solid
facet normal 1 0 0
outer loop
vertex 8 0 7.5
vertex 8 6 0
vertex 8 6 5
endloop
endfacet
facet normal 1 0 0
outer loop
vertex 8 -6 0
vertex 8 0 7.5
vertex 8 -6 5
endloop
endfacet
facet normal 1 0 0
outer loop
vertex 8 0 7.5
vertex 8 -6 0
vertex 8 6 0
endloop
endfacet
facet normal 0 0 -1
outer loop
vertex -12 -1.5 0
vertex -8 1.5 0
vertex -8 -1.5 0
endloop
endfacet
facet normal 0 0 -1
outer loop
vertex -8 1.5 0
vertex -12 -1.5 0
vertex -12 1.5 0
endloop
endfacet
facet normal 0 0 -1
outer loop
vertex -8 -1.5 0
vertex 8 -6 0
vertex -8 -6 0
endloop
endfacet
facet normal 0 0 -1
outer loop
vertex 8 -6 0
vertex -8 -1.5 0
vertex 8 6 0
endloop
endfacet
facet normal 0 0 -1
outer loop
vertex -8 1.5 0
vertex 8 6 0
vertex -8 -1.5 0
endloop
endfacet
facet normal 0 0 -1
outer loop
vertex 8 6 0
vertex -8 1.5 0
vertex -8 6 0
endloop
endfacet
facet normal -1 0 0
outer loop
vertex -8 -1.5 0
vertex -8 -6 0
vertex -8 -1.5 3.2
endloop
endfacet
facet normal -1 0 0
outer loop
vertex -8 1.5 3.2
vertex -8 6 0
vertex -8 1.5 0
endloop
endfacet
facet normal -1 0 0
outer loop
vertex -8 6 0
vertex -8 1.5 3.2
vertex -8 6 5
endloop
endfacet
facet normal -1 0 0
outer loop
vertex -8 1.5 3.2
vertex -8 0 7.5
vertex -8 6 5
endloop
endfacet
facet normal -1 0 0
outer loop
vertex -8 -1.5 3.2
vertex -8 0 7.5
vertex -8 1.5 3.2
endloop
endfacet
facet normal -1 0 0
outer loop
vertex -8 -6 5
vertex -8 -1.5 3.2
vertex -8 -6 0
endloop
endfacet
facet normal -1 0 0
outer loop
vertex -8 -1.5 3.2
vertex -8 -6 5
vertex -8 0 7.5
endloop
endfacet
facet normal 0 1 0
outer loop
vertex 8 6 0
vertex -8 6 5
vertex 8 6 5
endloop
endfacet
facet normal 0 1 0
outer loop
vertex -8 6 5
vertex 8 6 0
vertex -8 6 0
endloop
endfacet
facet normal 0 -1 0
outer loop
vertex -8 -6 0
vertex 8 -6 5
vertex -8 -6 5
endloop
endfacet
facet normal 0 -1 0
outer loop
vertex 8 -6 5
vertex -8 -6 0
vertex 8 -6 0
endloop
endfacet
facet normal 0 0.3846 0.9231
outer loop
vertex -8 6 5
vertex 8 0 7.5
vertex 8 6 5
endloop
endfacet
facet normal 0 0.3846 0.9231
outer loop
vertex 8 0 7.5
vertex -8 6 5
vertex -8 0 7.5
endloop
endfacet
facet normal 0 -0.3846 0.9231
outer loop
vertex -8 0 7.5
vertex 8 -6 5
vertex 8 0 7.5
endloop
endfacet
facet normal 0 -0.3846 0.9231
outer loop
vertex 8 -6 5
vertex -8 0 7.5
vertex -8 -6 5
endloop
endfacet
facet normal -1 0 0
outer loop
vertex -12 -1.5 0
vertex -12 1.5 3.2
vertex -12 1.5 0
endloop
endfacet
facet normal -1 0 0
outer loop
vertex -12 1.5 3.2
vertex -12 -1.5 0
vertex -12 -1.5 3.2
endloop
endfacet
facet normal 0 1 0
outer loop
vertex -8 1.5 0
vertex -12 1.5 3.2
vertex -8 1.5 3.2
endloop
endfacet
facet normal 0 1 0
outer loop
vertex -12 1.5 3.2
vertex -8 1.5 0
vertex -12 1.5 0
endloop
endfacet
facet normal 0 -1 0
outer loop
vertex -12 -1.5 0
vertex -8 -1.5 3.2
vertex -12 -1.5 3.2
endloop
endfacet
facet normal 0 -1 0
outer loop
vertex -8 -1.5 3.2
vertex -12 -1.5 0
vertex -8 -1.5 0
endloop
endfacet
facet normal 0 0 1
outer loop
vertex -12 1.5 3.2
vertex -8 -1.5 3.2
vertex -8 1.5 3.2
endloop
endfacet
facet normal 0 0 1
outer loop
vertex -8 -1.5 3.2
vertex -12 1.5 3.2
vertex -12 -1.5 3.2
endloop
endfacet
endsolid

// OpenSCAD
// Equipment shed — garage-style outbuilding for snowcats and snowmobiles.
// Reads as utilitarian: wider and lower than a lodge, with a shallow
// gable, prominent roll-up bay doors on the front (+X) for driving
// equipment in and out, and no decorative roof overhang.
//
// Sized for two snowcat bays (each cat is ~4 m wide × ~7 m long with
// blade) plus circulation space — 16 m × 12 m on the ground with
// 5 m wall height (clears a cat with the blade raised). Real snow-cat
// barns can be 25-30 m wide but a smaller building reads cleaner at
// game scale.
//
// Conventions, units, and axis docs: see models-src/README.md.

$fn = 12;

// ── Dimensions (metres) ────────────────────────────────────────────────
wall_w = 16.0; // long side, +X primary direction (door faces +X)
wall_d = 12.0; // short side, +Y perpendicular
wall_h = 5.0;  // wall height before the gable starts

roof_rise = 2.5; // shallow ~17° pitch — utilitarian, not residential

// Door geometry — two bays on the +X wall.
door_w     = 5.0; // each bay's width (Y axis on the front face)
door_h     = 4.0; // tall enough to clear a cat with its blade up
door_gap   = 1.0; // gap between the two doors
door_inset = 0.05; // recess depth so the door reads as a panel

// Office annex — a small bump-out on the −X back wall, suggesting
// where the foreman's desk and parts shelf live.
office_w = 4.0;
office_d = 3.0;
office_h = 3.0;

// ── Geometry ───────────────────────────────────────────────────────────
// Main hall — rectangular box centred on the origin, sitting on Z = 0.
module hall() {
    color("LightSteelBlue")
        translate([0, 0, wall_h / 2])
            cube([wall_w, wall_d, wall_h], center = true);
}

// Roof: triangular prism running along the long axis. Same scale trick
// as the lodge but with no overhang, so the building reads industrial.
module roof() {
    color("DimGray")
        translate([0, 0, wall_h])
            linear_extrude(height = roof_rise, scale = [1, 0])
                square([wall_w, wall_d], center = true);
}

// Two bay doors on the +X face. Each door is a thin panel inset into
// the wall by `door_inset` so it reads as a recessed door rather than
// a paint mark.
module bay_door(y_centre) {
    color("Goldenrod")
        translate([wall_w / 2 - door_inset / 2, y_centre, door_h / 2])
            cube([door_inset, door_w, door_h], center = true);
}

module bay_doors() {
    // Two doors centred on the front, separated by door_gap.
    half_span = door_w / 2 + door_gap / 2;
    bay_door(-half_span);
    bay_door(+half_span);
}

// Office annex on the −X back wall.
module office() {
    color("Tan")
        translate([-wall_w / 2 - office_w / 2, 0, office_h / 2])
            cube([office_w, office_d, office_h], center = true);
}

// A short flat-roof cap for the office so the gabled main roof doesn't
// have to extend over the bump-out.
module office_roof() {
    color("DimGray")
        translate([-wall_w / 2 - office_w / 2, 0, office_h + 0.1])
            cube([office_w, office_d, 0.2], center = true);
}

module shed() {
    hall();
    roof();
    bay_doors();
    office();
    office_roof();
}

shed();
